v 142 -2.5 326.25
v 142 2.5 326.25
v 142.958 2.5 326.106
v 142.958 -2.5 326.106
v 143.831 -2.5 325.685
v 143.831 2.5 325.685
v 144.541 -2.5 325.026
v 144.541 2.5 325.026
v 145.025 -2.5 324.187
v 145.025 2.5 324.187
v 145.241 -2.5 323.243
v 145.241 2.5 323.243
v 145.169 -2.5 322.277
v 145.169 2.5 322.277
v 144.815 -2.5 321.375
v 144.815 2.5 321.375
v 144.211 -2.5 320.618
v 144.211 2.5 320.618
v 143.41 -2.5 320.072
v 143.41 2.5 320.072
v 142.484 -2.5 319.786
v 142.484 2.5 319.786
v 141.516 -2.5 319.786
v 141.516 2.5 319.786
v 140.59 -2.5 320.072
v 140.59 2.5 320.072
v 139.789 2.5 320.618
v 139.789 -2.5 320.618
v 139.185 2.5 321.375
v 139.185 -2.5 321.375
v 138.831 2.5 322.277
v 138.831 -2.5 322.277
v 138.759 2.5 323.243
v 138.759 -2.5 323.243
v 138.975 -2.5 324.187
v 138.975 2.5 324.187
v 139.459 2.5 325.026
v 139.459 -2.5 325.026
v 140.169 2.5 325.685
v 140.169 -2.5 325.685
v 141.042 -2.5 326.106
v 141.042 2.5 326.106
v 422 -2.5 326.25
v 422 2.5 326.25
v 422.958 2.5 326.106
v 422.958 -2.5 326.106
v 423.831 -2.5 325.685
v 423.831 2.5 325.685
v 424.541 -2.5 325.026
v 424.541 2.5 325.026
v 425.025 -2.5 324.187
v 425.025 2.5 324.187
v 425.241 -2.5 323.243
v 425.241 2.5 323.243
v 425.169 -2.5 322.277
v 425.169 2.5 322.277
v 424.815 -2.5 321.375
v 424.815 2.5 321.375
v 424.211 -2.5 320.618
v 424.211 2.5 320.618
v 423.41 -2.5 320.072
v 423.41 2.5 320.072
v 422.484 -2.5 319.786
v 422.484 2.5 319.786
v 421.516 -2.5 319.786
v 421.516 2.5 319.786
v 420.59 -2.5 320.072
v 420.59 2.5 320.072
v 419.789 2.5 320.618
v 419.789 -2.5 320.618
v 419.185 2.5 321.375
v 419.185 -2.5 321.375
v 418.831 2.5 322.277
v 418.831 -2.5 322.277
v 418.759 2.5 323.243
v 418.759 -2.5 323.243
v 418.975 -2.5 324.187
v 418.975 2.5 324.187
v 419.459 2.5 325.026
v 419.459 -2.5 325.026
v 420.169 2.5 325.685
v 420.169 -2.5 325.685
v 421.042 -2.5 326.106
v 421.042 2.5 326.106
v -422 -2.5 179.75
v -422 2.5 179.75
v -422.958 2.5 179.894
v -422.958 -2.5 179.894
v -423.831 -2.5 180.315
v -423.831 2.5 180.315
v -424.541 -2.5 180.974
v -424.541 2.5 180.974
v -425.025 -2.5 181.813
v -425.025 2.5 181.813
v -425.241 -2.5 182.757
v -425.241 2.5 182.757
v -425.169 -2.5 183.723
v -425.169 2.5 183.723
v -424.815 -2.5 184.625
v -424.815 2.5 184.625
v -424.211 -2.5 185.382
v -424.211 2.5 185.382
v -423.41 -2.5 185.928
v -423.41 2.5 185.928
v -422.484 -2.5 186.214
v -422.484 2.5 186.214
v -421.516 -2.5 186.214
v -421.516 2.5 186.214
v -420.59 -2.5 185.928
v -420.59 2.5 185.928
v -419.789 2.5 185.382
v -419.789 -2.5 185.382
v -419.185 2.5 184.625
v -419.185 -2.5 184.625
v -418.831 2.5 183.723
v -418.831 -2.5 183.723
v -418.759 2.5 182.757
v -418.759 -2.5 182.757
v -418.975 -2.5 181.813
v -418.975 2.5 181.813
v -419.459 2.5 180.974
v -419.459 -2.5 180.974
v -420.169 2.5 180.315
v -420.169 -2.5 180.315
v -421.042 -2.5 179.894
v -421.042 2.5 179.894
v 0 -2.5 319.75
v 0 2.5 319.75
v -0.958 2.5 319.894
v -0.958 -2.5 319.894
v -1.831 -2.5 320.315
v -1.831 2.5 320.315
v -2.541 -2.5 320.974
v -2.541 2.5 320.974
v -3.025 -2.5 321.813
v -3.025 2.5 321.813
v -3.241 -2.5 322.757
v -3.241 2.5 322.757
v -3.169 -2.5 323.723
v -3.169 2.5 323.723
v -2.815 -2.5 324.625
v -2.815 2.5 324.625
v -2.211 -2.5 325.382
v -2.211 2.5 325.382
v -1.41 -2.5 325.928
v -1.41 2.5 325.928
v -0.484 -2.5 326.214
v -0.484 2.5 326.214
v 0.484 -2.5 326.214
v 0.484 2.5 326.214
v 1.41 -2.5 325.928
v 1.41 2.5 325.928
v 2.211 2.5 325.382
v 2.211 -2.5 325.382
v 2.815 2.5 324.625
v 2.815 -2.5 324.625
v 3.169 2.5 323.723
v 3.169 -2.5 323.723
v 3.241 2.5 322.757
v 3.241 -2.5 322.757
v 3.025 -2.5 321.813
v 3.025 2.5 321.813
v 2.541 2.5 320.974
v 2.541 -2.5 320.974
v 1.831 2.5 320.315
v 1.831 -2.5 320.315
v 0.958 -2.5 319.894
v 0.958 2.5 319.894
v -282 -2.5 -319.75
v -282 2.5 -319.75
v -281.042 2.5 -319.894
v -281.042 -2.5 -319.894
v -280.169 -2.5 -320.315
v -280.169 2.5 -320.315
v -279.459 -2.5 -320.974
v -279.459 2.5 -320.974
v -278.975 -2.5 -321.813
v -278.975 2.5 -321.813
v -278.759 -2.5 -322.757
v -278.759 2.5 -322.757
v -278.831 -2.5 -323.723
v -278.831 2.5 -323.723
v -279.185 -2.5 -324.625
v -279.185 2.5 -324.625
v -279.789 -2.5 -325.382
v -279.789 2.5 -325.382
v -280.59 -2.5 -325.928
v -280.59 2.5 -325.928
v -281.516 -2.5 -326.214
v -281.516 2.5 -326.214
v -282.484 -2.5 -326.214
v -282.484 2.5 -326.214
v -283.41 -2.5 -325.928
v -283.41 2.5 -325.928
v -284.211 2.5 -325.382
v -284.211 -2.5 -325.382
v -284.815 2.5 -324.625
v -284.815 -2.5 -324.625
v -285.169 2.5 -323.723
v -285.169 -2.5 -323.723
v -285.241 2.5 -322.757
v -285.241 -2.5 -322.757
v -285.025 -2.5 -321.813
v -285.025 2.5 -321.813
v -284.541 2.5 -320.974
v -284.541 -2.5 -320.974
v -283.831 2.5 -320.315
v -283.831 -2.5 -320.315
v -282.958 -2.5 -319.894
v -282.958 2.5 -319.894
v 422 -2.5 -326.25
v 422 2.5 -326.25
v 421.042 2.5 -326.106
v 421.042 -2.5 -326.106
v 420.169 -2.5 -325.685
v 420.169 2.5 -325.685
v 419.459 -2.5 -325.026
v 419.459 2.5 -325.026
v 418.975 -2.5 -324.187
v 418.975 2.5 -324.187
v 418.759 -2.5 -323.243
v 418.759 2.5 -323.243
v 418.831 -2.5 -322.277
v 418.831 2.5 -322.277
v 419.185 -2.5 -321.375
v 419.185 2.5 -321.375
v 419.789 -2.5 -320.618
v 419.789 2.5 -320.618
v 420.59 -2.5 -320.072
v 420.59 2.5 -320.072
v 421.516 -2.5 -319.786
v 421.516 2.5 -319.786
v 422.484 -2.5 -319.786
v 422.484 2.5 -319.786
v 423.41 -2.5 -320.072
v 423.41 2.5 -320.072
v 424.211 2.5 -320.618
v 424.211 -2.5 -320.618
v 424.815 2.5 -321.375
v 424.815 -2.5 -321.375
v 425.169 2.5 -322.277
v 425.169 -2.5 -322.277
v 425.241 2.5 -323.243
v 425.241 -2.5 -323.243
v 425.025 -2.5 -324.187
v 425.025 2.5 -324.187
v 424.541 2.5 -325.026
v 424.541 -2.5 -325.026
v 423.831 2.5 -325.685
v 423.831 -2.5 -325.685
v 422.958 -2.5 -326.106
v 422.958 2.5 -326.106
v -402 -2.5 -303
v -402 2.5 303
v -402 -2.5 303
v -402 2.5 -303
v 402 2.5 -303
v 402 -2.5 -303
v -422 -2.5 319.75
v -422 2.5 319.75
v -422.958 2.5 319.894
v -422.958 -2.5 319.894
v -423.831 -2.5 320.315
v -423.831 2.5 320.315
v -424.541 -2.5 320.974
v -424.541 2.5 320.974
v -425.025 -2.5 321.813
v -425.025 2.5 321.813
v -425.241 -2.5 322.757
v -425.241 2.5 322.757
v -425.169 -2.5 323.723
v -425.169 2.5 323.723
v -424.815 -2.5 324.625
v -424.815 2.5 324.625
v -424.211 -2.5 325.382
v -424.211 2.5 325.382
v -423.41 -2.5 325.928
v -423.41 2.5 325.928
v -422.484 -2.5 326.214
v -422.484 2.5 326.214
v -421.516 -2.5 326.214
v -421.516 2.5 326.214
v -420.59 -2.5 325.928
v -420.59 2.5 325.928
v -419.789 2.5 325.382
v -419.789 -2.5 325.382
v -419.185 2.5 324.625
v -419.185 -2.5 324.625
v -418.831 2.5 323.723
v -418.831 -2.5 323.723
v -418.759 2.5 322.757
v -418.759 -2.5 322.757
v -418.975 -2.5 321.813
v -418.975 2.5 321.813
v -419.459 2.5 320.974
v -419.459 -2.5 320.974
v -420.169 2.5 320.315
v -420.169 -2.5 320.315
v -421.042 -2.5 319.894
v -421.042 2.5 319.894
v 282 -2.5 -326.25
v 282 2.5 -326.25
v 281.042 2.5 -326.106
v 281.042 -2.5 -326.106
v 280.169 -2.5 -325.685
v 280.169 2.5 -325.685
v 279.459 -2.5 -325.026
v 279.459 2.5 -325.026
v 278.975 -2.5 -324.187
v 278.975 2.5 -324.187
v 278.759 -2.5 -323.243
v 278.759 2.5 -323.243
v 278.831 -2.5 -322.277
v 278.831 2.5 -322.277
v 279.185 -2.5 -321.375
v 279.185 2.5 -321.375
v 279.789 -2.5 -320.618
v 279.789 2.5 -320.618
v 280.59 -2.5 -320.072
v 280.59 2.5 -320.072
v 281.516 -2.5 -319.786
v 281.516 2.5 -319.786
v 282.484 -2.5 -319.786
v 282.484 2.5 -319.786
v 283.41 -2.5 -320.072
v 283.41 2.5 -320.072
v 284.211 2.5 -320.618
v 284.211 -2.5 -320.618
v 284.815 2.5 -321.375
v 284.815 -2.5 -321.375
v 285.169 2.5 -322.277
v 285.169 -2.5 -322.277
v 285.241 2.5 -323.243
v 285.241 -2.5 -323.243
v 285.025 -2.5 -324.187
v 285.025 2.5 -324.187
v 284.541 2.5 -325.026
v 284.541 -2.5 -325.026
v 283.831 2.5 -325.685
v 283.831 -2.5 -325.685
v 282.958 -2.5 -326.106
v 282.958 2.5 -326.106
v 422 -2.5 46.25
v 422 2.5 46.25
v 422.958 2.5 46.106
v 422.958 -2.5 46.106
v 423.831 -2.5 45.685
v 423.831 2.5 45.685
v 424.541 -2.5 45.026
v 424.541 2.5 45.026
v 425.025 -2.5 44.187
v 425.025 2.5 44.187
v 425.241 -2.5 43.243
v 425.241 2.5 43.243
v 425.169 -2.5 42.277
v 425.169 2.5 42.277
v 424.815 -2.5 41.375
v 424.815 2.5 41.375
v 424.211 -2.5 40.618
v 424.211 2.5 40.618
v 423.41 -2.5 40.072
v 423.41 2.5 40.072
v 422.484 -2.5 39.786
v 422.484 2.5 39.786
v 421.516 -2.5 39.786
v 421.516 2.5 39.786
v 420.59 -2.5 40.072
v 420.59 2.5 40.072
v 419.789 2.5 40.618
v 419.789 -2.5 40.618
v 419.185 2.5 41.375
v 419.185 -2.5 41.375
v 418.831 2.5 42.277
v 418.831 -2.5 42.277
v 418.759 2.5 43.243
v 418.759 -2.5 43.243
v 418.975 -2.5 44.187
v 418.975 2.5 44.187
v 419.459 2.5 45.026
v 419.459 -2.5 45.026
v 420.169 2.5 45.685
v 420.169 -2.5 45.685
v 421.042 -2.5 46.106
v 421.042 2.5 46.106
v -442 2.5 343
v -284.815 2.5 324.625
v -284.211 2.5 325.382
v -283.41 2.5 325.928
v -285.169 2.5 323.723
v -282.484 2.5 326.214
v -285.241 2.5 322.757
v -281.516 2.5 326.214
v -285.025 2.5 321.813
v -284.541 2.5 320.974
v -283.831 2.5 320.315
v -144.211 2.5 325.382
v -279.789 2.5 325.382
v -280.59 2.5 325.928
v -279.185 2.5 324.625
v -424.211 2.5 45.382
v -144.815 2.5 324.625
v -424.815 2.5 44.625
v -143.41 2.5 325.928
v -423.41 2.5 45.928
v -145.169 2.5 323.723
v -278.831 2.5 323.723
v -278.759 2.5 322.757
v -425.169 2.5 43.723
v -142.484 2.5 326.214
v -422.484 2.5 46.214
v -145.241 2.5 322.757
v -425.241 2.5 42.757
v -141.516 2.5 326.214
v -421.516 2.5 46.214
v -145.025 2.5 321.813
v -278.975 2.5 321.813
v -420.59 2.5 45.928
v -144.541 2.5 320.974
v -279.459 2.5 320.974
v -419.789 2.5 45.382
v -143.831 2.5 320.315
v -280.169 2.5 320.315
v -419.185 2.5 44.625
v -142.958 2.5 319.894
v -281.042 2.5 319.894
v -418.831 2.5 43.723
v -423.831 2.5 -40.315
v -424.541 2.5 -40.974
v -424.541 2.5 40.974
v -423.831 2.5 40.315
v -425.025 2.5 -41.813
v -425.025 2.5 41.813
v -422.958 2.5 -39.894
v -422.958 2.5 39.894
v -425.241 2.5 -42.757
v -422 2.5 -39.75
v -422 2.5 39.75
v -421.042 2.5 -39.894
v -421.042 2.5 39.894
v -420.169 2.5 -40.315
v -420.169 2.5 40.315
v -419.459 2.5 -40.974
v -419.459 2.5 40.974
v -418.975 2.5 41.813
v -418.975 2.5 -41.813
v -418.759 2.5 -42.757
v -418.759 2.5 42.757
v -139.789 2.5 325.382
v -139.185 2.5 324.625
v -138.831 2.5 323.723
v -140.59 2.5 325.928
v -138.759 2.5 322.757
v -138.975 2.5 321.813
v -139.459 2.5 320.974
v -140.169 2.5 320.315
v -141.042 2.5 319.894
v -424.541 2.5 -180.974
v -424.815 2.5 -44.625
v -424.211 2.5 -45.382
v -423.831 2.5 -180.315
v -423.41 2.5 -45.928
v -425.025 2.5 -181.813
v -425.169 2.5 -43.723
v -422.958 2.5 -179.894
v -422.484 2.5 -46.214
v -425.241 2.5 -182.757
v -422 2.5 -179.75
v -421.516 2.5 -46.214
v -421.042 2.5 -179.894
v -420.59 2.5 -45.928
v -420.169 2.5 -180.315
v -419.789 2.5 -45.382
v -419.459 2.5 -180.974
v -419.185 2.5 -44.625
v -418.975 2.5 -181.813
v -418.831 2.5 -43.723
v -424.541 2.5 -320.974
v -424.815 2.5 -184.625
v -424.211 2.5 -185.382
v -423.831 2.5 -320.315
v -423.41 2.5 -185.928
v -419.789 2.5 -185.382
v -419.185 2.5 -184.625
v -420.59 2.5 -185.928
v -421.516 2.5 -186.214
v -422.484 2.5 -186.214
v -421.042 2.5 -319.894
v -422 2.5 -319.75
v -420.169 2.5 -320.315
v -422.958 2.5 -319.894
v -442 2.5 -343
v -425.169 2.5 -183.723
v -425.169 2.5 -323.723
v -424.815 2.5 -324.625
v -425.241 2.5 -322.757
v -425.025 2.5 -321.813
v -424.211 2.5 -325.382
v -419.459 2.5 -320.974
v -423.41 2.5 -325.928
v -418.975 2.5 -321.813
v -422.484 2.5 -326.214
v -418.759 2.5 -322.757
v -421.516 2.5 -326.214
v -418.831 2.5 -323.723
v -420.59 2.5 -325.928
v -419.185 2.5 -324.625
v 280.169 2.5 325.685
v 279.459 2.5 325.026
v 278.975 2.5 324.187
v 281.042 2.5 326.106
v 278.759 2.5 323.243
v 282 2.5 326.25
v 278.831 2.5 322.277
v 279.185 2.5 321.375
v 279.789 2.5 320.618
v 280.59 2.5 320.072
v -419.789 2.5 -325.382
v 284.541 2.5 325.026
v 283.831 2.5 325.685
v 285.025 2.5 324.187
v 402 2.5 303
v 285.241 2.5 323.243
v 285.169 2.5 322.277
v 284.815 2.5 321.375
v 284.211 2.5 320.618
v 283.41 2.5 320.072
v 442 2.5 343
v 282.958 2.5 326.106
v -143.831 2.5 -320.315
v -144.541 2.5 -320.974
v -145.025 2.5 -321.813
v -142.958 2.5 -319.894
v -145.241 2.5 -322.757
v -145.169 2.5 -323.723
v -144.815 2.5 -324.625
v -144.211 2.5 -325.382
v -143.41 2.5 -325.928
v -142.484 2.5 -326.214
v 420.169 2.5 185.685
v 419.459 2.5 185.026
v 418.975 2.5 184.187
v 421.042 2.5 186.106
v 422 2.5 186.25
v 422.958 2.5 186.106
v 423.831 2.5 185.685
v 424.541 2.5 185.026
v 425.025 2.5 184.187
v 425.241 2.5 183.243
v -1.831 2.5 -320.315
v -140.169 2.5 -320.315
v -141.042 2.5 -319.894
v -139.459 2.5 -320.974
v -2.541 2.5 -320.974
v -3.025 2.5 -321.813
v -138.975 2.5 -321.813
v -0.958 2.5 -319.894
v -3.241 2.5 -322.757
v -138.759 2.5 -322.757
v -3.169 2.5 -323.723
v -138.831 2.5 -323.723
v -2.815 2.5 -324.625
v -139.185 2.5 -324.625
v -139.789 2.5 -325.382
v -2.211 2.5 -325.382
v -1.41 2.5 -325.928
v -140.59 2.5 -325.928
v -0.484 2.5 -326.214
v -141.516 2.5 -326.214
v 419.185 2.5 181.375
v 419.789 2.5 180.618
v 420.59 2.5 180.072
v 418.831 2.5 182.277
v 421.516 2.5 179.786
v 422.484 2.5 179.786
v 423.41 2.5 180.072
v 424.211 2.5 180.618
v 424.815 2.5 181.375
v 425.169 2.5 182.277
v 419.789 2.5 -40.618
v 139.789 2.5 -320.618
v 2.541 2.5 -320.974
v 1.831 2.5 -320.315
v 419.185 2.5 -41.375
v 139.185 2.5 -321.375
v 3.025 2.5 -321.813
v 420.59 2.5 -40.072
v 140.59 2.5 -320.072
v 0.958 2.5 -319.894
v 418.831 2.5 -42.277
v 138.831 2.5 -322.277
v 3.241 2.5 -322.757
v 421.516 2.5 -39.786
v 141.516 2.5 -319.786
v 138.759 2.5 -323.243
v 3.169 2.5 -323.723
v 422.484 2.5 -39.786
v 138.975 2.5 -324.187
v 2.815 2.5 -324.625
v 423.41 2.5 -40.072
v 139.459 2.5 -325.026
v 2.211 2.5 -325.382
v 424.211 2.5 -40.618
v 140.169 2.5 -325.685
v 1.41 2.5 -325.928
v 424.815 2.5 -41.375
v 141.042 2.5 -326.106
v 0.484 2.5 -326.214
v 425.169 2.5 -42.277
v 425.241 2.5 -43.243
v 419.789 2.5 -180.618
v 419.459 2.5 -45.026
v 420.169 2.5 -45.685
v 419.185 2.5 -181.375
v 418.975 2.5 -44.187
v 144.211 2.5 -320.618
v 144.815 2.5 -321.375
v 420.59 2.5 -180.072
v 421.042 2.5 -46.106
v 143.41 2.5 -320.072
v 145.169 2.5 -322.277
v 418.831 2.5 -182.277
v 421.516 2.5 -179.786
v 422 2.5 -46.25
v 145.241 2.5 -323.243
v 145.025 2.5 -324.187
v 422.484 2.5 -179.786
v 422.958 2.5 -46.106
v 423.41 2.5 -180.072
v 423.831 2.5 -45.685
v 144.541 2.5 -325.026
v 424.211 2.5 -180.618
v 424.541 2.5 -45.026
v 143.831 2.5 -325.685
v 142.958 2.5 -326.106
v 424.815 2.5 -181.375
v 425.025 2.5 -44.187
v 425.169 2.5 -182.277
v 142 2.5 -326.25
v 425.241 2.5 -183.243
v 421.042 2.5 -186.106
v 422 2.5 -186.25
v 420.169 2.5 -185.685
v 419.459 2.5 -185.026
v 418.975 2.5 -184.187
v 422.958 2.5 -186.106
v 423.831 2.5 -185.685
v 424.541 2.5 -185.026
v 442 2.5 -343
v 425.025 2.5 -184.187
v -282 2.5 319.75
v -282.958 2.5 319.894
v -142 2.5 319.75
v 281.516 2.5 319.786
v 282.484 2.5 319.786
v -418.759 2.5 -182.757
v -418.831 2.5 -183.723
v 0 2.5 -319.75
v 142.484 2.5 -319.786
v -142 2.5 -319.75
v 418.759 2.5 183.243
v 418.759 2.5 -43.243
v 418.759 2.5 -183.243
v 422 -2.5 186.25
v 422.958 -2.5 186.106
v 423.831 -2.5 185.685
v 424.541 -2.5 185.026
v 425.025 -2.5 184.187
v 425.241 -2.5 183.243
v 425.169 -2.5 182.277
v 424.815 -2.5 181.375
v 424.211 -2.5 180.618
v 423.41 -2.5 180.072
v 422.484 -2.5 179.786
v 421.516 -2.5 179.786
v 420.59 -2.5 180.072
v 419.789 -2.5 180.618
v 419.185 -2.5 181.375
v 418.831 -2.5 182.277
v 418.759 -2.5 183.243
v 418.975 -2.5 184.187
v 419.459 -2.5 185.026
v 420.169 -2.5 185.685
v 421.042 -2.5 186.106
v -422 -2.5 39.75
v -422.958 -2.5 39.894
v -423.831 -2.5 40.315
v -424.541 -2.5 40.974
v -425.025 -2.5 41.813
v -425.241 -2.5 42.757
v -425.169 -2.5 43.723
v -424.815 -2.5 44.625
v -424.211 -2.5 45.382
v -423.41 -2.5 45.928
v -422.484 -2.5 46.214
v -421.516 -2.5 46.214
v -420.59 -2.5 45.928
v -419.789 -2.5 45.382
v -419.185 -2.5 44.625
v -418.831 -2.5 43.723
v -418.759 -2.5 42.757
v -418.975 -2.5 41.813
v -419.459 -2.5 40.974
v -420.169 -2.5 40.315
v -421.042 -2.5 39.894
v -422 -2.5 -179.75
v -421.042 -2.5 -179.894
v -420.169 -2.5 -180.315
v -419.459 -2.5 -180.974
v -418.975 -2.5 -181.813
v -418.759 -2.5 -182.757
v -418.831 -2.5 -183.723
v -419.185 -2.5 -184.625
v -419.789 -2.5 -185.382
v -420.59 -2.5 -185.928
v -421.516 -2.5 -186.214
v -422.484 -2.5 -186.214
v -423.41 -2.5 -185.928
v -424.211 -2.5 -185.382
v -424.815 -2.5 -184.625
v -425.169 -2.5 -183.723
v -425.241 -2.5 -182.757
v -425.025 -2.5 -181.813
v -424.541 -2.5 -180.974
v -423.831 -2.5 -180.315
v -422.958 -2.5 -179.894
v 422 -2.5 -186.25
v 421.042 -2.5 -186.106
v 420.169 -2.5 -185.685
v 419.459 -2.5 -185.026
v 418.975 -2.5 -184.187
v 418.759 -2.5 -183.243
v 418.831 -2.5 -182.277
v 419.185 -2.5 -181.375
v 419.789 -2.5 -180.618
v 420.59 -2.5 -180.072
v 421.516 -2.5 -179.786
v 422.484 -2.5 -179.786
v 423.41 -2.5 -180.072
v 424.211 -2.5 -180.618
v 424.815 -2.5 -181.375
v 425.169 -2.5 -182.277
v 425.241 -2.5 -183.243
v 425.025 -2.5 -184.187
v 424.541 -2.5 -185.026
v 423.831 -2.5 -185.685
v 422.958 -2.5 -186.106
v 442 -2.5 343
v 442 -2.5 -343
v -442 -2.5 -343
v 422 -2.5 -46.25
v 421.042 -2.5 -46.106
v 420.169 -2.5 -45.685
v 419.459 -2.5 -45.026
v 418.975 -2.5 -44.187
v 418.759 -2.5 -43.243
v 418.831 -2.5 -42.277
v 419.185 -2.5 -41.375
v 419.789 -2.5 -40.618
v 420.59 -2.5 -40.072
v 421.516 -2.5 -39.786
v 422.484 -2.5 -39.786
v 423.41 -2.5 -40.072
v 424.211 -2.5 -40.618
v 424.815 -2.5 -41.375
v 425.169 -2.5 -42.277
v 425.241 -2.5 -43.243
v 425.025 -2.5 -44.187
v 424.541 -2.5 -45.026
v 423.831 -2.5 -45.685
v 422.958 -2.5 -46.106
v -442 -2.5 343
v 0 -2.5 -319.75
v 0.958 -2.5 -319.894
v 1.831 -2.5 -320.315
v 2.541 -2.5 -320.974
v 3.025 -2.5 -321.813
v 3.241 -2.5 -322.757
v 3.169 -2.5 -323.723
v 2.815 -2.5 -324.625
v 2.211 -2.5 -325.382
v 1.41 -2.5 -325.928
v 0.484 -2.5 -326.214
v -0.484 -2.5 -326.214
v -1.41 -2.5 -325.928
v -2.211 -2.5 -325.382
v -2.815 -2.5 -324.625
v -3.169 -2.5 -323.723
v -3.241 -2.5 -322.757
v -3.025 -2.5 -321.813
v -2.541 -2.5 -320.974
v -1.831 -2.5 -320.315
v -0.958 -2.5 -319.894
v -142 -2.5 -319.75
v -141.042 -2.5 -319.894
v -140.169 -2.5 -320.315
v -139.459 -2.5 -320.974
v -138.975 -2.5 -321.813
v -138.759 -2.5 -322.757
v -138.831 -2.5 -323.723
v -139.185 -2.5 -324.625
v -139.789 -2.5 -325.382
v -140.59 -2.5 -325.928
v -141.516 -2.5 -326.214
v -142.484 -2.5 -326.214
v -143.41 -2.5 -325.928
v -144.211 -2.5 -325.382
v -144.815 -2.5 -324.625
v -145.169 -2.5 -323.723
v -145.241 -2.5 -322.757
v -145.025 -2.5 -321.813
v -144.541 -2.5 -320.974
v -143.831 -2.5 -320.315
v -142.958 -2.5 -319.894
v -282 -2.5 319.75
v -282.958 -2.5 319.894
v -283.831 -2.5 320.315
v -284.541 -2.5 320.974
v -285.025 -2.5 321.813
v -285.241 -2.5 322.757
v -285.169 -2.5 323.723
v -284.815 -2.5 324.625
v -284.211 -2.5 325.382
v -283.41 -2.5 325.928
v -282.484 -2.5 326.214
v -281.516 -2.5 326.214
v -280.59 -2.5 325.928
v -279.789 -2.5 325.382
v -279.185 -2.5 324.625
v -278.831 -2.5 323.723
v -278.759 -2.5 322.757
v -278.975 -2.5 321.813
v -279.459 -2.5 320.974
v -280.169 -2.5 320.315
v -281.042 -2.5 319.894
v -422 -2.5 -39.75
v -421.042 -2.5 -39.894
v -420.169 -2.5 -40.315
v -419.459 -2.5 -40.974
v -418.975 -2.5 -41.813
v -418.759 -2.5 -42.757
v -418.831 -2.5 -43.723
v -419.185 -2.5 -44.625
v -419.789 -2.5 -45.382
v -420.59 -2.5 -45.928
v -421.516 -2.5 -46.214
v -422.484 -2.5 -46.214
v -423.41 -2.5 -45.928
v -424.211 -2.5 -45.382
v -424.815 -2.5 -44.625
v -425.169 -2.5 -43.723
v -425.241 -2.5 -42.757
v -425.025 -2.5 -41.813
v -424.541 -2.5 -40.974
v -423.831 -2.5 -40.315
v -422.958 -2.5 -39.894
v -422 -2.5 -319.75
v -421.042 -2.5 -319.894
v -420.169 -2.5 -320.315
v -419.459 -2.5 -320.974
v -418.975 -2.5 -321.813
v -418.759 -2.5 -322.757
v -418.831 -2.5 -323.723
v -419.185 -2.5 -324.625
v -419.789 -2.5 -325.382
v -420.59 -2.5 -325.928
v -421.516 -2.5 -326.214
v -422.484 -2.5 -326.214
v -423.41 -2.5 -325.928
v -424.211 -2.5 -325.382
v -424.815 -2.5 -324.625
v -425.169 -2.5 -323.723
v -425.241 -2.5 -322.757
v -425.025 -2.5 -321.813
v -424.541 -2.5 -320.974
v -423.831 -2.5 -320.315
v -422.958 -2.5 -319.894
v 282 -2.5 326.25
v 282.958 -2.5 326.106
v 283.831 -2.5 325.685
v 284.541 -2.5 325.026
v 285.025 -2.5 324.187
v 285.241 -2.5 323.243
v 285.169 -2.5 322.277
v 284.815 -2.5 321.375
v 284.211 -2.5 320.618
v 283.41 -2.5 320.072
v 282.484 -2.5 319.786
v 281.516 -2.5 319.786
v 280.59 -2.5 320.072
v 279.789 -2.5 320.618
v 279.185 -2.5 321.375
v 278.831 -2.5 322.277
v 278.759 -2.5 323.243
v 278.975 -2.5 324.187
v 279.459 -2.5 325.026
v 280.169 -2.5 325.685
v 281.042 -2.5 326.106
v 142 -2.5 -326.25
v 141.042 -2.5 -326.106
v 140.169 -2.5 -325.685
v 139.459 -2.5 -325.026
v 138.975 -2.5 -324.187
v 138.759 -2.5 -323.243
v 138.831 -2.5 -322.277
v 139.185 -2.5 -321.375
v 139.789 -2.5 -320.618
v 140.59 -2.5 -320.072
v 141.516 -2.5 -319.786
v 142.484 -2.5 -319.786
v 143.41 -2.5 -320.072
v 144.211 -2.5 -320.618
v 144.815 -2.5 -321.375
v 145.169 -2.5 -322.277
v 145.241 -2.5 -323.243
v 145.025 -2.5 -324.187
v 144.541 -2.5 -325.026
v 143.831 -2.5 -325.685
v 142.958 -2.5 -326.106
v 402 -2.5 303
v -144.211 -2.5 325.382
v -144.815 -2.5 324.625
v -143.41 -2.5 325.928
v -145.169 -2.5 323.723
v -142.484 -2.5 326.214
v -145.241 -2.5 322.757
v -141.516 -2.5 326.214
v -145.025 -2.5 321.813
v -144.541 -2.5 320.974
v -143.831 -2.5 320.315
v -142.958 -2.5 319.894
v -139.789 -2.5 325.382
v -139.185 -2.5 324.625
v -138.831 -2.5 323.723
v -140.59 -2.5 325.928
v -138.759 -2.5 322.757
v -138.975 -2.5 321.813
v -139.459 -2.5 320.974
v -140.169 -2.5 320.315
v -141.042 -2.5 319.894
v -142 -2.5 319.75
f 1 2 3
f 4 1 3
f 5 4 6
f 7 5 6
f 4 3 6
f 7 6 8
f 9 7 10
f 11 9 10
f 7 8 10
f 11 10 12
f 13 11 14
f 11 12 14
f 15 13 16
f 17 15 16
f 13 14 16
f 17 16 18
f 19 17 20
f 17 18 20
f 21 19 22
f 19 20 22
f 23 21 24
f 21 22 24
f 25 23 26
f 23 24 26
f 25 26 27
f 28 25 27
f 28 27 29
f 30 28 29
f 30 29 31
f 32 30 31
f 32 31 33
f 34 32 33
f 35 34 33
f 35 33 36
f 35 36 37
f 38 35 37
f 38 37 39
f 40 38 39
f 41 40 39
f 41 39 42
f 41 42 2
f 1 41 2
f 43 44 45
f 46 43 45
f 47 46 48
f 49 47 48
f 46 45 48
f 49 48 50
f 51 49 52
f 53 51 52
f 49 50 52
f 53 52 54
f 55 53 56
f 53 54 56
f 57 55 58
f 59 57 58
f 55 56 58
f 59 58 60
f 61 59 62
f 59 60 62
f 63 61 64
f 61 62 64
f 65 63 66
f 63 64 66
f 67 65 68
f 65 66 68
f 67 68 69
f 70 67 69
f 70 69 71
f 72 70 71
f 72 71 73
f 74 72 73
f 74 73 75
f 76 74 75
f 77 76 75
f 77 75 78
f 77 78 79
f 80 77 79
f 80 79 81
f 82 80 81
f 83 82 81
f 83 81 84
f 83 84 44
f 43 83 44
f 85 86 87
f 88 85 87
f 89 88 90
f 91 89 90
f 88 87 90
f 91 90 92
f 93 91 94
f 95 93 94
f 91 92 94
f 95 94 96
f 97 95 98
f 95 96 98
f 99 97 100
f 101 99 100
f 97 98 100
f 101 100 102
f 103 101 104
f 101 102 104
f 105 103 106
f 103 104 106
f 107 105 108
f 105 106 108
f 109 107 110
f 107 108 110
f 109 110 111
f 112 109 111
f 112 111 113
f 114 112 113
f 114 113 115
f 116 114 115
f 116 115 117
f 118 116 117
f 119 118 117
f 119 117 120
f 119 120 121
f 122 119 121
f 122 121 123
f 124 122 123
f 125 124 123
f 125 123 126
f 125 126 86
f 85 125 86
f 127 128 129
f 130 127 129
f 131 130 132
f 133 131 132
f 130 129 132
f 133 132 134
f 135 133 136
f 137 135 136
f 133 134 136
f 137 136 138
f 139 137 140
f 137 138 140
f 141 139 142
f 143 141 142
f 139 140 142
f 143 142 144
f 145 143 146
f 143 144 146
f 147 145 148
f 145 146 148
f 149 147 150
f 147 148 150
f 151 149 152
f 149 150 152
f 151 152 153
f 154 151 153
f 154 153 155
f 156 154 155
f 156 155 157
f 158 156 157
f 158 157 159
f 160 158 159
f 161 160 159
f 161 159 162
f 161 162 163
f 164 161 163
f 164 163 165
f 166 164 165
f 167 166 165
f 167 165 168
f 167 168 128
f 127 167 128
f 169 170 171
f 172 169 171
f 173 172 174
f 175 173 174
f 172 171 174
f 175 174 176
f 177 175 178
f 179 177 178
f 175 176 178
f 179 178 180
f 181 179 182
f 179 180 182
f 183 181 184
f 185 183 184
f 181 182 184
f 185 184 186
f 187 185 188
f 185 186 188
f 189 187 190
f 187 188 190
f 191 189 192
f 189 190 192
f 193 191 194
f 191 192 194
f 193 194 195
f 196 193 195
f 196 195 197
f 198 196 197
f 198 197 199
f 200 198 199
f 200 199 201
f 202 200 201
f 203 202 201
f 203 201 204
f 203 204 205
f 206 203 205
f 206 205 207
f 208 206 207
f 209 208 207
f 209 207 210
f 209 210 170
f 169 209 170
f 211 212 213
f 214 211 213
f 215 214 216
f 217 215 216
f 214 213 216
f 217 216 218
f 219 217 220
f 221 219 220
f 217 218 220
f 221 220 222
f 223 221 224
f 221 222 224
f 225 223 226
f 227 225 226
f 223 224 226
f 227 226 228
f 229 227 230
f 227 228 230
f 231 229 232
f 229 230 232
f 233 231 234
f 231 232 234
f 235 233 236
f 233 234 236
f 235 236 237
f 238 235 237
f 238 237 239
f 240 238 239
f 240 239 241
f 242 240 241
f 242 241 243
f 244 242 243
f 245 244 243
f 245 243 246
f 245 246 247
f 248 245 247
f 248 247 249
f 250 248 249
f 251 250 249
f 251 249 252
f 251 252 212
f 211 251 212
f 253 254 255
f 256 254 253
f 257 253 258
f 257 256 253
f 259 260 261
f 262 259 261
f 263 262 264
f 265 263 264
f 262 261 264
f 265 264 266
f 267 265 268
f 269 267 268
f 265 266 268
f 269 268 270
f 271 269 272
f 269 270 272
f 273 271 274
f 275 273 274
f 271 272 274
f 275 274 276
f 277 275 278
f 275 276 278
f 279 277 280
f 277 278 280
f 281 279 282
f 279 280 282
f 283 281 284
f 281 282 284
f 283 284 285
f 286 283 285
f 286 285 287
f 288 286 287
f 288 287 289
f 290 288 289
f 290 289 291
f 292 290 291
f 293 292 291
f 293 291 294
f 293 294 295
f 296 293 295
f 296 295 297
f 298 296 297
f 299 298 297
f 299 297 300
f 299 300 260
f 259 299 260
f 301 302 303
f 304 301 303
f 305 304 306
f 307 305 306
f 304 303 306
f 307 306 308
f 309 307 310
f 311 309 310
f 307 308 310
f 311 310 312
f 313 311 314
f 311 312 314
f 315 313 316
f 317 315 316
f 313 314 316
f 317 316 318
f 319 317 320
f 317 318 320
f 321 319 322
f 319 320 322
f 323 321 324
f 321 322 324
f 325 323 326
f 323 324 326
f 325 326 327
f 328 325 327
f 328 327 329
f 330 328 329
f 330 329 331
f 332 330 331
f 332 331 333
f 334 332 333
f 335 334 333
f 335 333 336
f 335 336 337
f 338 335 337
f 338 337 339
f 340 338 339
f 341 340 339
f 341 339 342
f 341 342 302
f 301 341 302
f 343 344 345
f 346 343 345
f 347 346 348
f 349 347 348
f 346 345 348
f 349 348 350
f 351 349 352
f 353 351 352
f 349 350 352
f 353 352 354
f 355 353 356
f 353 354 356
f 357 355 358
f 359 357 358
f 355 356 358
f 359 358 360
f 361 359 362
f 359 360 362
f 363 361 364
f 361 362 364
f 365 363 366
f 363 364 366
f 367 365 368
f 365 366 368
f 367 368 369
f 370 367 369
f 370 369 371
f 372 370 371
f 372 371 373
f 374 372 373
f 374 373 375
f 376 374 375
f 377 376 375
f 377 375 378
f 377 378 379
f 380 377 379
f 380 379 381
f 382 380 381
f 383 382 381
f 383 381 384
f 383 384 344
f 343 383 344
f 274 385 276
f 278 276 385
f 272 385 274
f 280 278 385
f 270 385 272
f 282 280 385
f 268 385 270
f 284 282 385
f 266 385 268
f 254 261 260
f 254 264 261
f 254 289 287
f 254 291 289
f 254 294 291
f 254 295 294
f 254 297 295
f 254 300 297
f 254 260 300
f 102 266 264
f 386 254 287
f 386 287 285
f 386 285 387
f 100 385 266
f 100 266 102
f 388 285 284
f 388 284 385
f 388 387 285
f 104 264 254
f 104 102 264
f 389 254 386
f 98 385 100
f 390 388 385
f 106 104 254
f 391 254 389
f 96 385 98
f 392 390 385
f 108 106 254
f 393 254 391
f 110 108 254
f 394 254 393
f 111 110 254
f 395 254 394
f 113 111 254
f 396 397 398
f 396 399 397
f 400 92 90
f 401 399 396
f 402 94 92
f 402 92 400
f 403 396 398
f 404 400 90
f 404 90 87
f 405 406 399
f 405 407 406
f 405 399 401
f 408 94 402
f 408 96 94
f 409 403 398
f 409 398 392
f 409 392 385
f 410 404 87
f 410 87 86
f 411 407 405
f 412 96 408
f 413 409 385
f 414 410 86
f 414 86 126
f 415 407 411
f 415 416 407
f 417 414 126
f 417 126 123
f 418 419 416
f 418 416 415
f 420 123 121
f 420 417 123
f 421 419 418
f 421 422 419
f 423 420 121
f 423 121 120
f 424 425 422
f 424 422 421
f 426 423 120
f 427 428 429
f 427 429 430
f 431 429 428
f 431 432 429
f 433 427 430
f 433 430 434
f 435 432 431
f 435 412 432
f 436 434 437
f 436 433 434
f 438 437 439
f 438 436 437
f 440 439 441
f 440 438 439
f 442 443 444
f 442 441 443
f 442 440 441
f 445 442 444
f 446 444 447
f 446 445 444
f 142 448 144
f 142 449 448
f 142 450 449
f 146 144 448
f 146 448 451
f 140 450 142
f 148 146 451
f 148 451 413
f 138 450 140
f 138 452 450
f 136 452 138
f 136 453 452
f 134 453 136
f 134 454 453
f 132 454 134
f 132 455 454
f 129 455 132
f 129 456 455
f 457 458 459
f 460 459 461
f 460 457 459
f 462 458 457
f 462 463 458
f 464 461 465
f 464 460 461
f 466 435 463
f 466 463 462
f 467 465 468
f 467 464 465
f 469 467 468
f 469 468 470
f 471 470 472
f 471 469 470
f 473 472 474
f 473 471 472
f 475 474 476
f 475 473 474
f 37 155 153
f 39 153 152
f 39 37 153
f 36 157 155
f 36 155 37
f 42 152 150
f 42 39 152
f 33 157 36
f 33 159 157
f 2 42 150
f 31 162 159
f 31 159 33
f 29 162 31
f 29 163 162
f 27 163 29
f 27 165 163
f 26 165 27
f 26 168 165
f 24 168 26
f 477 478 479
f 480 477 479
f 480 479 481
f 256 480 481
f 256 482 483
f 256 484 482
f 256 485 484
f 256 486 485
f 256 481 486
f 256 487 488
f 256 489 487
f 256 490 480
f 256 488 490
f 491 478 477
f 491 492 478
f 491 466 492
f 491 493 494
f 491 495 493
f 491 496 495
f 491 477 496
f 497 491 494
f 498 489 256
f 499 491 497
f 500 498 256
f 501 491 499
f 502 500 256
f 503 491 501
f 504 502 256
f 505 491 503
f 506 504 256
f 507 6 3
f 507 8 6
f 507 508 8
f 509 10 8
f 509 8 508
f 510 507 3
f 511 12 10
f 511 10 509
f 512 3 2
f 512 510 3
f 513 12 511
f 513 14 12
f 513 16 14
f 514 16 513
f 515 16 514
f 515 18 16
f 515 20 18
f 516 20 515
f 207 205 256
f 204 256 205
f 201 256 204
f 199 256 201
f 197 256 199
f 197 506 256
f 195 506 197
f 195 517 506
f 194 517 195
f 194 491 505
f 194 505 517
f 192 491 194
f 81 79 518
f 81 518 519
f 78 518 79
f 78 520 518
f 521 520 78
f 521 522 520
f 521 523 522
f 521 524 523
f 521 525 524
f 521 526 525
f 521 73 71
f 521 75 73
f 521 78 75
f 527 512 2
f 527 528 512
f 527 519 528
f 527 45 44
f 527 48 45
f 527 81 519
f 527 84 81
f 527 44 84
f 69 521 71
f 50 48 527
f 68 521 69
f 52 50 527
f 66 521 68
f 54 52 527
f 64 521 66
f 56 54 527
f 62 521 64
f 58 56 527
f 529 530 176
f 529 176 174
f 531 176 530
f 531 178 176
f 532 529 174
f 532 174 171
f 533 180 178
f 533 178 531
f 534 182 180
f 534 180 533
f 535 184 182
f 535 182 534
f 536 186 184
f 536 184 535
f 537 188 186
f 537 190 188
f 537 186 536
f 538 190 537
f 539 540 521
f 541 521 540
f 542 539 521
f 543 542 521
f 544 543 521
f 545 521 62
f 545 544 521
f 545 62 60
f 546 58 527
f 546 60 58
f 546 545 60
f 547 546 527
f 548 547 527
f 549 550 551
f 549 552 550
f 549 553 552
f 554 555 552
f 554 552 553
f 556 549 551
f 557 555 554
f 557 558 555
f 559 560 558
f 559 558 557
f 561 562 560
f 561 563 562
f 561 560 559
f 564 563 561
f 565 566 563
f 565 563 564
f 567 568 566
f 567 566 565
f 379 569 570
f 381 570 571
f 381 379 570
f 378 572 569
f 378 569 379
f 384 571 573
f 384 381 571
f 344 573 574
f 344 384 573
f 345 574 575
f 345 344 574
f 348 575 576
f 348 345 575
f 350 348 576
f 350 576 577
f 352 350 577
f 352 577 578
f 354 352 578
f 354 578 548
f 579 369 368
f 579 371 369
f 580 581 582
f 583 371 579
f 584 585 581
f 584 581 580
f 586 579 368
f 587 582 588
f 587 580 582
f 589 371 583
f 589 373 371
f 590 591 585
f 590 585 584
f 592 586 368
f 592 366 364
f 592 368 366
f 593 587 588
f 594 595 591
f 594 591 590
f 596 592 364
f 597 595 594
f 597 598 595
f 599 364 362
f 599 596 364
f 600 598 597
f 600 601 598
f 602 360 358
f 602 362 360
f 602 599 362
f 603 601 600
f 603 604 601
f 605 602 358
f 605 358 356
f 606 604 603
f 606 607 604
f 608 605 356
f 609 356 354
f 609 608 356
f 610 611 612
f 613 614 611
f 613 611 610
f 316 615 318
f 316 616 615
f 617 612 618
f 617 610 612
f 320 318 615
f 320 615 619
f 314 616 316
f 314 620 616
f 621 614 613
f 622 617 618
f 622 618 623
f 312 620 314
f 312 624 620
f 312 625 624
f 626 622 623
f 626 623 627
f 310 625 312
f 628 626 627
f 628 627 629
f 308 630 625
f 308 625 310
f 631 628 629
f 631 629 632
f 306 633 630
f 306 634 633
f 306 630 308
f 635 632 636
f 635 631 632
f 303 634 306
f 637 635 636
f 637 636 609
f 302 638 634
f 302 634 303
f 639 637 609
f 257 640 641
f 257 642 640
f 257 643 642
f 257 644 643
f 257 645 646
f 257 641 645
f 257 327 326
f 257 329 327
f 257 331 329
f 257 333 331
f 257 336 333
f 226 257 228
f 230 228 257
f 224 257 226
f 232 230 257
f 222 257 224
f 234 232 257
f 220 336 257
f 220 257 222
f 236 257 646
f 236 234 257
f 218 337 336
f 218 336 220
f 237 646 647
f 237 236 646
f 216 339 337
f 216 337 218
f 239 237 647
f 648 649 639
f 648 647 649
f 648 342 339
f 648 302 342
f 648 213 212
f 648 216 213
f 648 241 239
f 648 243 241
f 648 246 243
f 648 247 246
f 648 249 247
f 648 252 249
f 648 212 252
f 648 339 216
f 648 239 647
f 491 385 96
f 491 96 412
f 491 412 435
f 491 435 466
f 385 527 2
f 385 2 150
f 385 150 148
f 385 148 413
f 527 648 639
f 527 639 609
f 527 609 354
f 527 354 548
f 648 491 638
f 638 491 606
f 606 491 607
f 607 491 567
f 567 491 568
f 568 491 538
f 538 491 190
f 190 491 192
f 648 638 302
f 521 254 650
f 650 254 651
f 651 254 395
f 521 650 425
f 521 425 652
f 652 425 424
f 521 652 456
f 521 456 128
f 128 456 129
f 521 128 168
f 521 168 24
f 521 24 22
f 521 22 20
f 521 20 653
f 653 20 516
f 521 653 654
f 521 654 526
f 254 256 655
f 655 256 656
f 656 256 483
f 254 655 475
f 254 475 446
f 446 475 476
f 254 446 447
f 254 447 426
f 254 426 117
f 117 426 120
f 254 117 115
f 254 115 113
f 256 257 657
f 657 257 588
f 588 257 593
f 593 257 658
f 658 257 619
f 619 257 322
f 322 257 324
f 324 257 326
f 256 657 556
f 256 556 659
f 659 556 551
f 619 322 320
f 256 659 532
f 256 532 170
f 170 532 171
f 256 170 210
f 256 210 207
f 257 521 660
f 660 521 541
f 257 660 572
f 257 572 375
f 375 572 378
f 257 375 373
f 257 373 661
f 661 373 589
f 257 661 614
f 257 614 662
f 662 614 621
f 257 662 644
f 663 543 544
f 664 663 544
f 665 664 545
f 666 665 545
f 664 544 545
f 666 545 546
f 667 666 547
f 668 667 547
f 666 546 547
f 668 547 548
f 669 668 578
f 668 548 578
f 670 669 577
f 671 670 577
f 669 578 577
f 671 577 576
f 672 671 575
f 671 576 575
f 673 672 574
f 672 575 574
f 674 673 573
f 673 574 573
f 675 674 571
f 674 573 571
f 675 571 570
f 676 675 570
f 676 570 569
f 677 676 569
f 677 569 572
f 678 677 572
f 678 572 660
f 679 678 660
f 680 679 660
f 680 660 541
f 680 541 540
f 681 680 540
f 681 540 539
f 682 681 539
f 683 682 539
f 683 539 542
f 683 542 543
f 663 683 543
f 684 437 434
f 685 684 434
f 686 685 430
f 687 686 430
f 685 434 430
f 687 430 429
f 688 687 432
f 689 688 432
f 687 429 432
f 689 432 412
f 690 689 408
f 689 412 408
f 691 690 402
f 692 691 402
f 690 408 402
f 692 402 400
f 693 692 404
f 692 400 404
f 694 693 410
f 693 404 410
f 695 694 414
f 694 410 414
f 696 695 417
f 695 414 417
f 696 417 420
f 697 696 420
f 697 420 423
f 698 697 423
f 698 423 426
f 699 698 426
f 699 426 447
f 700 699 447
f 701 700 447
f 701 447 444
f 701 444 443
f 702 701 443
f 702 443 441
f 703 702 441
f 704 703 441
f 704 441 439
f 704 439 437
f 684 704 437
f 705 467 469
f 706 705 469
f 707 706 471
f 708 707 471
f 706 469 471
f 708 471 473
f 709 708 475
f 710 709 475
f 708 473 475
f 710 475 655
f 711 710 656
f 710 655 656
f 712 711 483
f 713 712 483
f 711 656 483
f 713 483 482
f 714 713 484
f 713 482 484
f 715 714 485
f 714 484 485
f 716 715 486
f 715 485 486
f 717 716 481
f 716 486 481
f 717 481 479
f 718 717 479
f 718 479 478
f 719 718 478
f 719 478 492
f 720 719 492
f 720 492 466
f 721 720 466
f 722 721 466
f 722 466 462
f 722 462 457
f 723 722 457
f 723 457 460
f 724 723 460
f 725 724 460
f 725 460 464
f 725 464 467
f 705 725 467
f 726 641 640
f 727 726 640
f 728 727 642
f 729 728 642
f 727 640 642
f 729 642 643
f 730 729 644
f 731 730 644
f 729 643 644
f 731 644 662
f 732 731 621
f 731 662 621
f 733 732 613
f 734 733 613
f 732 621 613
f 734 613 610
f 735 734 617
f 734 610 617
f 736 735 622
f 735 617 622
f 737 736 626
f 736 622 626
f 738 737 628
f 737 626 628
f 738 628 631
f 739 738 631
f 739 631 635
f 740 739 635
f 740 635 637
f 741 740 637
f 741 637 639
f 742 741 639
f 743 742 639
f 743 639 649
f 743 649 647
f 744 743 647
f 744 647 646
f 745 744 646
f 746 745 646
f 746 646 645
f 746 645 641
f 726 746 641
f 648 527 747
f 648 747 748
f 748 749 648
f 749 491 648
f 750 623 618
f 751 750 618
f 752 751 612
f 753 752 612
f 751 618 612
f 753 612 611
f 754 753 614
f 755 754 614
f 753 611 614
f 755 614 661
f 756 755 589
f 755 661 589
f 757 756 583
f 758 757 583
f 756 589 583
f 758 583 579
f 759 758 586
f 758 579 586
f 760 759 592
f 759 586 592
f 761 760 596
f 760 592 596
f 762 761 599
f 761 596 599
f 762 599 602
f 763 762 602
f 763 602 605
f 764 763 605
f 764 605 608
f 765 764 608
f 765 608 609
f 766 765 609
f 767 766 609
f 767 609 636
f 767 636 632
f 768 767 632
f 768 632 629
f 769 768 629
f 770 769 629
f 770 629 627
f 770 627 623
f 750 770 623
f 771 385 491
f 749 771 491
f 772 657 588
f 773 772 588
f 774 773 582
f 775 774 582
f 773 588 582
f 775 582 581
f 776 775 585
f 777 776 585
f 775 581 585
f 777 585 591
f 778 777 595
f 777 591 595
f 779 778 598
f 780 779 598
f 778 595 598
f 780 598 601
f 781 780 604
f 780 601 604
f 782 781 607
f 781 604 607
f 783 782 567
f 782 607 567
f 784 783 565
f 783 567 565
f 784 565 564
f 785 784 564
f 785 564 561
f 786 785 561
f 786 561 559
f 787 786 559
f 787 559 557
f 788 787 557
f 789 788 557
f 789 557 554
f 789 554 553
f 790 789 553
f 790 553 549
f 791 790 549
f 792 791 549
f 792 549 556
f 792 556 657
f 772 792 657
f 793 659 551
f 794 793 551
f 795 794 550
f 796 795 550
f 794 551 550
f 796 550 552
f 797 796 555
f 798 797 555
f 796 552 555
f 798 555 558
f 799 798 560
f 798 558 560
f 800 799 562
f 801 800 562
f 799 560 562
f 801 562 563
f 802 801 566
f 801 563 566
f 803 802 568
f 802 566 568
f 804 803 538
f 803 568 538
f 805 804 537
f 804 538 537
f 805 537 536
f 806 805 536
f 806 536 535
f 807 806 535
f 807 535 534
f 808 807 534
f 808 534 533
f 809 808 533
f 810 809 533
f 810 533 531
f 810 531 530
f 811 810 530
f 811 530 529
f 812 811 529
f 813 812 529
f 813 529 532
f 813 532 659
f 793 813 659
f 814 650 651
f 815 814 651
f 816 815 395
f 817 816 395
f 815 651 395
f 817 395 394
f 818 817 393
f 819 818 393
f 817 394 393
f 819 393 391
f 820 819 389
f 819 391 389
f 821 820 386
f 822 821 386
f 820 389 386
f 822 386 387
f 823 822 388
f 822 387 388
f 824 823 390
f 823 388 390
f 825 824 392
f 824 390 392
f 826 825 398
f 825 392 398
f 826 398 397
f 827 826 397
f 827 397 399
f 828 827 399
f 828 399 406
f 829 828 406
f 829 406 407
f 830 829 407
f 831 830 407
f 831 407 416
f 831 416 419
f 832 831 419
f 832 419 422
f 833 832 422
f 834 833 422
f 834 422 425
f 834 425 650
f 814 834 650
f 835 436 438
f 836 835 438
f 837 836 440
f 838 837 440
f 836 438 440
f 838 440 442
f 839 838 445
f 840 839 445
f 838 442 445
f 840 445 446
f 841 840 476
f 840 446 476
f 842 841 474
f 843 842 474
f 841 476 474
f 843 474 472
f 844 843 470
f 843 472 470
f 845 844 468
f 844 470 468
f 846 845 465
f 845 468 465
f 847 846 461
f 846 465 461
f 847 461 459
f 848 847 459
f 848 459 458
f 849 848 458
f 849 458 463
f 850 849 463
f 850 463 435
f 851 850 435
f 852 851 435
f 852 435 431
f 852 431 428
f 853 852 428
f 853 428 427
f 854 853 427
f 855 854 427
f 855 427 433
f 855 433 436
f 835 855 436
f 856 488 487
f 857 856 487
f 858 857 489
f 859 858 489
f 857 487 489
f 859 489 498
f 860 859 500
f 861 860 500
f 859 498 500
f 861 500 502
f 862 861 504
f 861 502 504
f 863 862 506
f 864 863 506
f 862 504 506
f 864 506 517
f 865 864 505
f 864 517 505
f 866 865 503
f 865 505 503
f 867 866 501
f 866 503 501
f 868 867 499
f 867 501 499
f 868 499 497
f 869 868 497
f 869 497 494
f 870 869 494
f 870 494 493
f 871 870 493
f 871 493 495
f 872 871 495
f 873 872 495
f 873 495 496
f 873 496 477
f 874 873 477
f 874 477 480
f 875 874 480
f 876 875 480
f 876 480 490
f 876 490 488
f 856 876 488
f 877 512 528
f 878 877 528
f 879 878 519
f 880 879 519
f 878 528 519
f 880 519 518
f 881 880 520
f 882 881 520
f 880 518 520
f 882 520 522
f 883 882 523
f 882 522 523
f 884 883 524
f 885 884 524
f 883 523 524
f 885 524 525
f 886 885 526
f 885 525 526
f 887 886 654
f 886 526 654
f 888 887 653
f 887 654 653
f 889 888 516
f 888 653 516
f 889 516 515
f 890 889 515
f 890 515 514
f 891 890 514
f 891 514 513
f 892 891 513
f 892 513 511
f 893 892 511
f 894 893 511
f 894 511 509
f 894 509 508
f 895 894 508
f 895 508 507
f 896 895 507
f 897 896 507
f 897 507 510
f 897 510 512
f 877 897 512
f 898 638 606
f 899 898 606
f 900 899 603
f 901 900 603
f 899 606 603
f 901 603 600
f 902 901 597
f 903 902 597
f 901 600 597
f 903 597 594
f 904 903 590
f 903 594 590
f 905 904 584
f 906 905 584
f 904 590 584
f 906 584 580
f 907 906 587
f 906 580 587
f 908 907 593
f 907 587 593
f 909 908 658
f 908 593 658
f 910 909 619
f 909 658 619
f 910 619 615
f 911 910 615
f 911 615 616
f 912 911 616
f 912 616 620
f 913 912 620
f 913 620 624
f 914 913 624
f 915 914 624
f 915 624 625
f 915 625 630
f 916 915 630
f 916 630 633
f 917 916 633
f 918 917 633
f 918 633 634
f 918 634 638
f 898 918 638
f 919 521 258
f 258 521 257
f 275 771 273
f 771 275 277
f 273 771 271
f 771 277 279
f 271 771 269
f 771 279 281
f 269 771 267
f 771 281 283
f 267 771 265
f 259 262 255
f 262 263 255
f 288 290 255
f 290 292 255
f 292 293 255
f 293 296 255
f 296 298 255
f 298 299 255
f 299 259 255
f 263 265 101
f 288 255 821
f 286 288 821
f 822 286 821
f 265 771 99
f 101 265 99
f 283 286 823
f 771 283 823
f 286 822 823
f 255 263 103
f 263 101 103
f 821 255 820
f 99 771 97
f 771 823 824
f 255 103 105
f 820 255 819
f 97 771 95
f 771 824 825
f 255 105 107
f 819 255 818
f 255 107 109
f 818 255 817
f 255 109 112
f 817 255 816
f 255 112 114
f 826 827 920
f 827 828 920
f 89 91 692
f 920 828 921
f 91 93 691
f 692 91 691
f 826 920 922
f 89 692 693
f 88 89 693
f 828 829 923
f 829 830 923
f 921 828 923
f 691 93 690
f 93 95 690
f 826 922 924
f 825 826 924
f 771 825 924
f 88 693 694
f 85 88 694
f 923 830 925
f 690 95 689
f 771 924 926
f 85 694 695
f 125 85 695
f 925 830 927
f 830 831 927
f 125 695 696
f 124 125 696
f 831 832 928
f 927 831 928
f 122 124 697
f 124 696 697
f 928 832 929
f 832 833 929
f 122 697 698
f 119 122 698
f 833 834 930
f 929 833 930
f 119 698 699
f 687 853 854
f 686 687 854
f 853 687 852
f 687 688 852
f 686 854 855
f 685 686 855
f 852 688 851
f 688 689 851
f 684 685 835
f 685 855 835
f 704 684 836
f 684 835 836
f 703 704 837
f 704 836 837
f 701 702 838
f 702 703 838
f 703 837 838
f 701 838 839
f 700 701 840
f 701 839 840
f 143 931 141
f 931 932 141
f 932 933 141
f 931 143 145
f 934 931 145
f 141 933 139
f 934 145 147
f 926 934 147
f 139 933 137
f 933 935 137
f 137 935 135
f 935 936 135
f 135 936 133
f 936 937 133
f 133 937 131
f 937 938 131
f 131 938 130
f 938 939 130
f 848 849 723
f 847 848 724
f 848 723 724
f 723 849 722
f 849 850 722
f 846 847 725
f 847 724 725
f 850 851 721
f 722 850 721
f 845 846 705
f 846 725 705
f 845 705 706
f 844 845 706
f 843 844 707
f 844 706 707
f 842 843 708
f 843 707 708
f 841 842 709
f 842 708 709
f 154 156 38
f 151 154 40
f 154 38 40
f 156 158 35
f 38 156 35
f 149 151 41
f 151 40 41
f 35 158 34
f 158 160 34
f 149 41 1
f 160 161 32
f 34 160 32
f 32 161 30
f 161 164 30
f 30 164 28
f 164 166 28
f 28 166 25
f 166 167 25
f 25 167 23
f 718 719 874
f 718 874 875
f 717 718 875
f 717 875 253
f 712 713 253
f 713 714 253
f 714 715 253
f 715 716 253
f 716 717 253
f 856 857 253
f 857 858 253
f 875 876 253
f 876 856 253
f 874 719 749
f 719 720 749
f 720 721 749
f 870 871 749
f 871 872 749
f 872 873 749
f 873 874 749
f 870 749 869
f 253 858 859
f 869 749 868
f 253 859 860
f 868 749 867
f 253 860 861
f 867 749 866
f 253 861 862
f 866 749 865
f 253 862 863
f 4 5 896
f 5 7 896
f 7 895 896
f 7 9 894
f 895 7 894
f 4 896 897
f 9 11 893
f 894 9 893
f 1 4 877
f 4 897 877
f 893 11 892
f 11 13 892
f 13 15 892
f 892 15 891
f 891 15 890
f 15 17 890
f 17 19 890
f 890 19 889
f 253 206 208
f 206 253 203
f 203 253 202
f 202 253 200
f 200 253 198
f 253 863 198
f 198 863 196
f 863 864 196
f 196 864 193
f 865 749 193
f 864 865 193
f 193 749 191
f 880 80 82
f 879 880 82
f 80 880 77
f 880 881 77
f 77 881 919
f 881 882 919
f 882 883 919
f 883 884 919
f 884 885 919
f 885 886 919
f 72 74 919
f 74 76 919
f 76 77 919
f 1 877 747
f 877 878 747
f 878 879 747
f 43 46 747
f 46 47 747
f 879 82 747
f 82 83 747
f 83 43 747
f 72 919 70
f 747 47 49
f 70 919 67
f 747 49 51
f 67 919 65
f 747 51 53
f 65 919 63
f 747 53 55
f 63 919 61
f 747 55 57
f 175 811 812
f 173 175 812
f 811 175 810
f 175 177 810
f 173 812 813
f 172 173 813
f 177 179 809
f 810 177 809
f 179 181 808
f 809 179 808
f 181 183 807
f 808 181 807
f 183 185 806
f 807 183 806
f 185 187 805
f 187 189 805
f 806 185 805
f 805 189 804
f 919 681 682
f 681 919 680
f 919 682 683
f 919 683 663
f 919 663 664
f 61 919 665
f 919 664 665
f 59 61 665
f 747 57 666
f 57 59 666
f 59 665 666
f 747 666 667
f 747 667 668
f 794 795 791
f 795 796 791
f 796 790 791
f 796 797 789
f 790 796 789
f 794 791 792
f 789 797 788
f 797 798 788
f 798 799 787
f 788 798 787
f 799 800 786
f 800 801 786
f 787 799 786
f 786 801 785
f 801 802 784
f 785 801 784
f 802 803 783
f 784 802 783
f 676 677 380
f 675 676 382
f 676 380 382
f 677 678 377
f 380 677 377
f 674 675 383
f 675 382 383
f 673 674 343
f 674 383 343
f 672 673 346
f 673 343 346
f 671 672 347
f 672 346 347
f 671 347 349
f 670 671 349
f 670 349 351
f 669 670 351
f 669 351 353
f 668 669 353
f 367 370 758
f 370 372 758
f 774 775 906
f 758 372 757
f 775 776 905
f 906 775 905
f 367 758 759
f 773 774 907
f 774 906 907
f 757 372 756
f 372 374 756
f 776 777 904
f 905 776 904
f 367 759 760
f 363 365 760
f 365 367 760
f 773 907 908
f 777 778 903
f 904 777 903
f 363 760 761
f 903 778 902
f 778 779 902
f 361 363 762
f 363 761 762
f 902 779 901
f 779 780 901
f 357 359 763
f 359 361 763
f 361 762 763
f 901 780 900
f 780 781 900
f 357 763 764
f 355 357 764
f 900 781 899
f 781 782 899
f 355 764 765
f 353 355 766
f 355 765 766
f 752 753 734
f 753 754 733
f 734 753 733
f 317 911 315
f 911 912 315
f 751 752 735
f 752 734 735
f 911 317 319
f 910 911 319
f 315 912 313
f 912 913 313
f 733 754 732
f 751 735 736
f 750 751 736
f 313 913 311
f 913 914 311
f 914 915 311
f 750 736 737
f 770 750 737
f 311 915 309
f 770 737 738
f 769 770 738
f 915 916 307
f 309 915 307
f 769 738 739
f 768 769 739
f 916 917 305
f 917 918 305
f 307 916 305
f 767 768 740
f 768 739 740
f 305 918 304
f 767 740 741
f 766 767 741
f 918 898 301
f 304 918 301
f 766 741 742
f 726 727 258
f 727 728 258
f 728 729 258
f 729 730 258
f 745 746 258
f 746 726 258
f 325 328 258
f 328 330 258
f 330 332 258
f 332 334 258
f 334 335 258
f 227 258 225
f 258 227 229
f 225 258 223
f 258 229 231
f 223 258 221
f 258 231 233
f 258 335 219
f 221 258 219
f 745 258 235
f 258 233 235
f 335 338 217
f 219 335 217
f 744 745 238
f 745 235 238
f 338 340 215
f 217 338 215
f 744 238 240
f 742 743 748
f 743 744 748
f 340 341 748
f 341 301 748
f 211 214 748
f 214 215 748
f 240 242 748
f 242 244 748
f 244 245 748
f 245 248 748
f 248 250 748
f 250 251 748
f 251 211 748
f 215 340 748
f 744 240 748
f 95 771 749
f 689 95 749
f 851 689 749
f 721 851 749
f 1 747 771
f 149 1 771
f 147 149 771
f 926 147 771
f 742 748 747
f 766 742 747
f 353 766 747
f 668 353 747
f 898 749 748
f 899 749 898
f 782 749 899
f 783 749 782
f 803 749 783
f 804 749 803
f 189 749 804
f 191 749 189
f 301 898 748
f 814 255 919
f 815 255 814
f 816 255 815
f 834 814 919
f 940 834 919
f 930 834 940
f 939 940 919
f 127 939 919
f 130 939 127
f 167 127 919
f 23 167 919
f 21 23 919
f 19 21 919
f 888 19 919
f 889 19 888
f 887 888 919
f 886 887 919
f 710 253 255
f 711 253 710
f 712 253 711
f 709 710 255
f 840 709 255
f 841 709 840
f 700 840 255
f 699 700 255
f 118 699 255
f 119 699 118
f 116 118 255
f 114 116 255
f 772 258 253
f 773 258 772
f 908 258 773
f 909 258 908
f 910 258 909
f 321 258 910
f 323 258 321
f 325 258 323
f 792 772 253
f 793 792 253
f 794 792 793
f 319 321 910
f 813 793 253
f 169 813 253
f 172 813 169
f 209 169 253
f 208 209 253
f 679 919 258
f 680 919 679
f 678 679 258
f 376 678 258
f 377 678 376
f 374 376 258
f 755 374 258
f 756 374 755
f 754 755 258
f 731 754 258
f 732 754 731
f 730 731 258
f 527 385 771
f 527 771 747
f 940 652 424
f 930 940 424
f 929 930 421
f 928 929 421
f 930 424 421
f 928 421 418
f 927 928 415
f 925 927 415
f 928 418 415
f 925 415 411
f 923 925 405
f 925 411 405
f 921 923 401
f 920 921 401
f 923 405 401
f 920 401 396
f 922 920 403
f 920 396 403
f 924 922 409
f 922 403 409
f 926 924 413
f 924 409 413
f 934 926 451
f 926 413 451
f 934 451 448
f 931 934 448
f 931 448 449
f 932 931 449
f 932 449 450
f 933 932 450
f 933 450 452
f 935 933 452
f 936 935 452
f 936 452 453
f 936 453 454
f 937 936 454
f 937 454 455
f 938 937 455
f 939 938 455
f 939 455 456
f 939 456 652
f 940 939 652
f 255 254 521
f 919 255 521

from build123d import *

# Parameters (mm, degrees)
SCHIZZO1_W                   = 884
SCHIZZO1_H                   = 686
SCHIZZO1_W_2                 = 804
SCHIZZO1_H_2                 = 606
ESTRUSIONE_ESTRUSIONE1_DEPTH = 2.5
SCHIZZO2_R                   = 3.25
TAGLIO_ESTRUSIONE1_DEPTH     = 560.497989273


with BuildPart() as part:
    # Schizzo1 → Estrusione-Estrusione1 (new, symmetric)
    with BuildSketch(Plane(origin=(0, 0, 0), x_dir=(1, 0, 0), z_dir=(0, 1, 0))):
        Rectangle(SCHIZZO1_W, SCHIZZO1_H)
        Rectangle(SCHIZZO1_W_2, SCHIZZO1_H_2, mode=Mode.SUBTRACT)
    extrude(amount=ESTRUSIONE_ESTRUSIONE1_DEPTH, both=True)

    # Schizzo2 → Taglio-Estrusione1 (cut, through all)
    with BuildSketch(Plane(origin=(0, 2.5, 0), x_dir=(1, 0, 0), z_dir=(0, 1, 0))):
        with Locations(Location((-422, 323, 0), (0, 0, 270))):
            Circle(SCHIZZO2_R)
        with Locations(Location((422, 323, 0), (0, 0, 90))):
            Circle(SCHIZZO2_R)
        with Locations(Location((422, -323, 0), (0, 0, 270))):
            Circle(SCHIZZO2_R)
        with Locations(Location((-422, -323, 0), (0, 0, 90))):
            Circle(SCHIZZO2_R)
        with Locations(Location((-282, 323, 0), (0, 0, 270))):
            Circle(SCHIZZO2_R)
        with Locations(Location((-142, 323, 0), (0, 0, 270))):
            Circle(SCHIZZO2_R)
        with Locations(Location((0, 323, 0), (0, 0, 270))):
            Circle(SCHIZZO2_R)
        with Locations(Location((142, 323, 0), (0, 0, 90))):
            Circle(SCHIZZO2_R)
        with Locations(Location((282, 323, 0), (0, 0, 90))):
            Circle(SCHIZZO2_R)
        with Locations(Location((282, -323, 0), (0, 0, 270))):
            Circle(SCHIZZO2_R)
        with Locations(Location((142, -323, 0), (0, 0, 270))):
            Circle(SCHIZZO2_R)
        with Locations(Location((0, -323, 0), (0, 0, 90))):
            Circle(SCHIZZO2_R)
        with Locations(Location((-142, -323, 0), (0, 0, 90))):
            Circle(SCHIZZO2_R)
        with Locations(Location((-282, -323, 0), (0, 0, 90))):
            Circle(SCHIZZO2_R)
        with Locations(Location((-422, 183, 0), (0, 0, 270))):
            Circle(SCHIZZO2_R)
        with Locations(Location((-422, 43, 0), (0, 0, 270))):
            Circle(SCHIZZO2_R)
        with Locations(Location((-422, -43, 0), (0, 0, 90))):
            Circle(SCHIZZO2_R)
        with Locations(Location((-422, -183, 0), (0, 0, 90))):
            Circle(SCHIZZO2_R)
        with Locations(Location((422, -183, 0), (0, 0, 270))):
            Circle(SCHIZZO2_R)
        with Locations(Location((422, -43, 0), (0, 0, 270))):
            Circle(SCHIZZO2_R)
        with Locations(Location((422, 43, 0), (0, 0, 90))):
            Circle(SCHIZZO2_R)
        with Locations(Location((422, 183, 0), (0, 0, 90))):
            Circle(SCHIZZO2_R)
    extrude(amount=-TAGLIO_ESTRUSIONE1_DEPTH, mode=Mode.SUBTRACT)


solid = part.part
